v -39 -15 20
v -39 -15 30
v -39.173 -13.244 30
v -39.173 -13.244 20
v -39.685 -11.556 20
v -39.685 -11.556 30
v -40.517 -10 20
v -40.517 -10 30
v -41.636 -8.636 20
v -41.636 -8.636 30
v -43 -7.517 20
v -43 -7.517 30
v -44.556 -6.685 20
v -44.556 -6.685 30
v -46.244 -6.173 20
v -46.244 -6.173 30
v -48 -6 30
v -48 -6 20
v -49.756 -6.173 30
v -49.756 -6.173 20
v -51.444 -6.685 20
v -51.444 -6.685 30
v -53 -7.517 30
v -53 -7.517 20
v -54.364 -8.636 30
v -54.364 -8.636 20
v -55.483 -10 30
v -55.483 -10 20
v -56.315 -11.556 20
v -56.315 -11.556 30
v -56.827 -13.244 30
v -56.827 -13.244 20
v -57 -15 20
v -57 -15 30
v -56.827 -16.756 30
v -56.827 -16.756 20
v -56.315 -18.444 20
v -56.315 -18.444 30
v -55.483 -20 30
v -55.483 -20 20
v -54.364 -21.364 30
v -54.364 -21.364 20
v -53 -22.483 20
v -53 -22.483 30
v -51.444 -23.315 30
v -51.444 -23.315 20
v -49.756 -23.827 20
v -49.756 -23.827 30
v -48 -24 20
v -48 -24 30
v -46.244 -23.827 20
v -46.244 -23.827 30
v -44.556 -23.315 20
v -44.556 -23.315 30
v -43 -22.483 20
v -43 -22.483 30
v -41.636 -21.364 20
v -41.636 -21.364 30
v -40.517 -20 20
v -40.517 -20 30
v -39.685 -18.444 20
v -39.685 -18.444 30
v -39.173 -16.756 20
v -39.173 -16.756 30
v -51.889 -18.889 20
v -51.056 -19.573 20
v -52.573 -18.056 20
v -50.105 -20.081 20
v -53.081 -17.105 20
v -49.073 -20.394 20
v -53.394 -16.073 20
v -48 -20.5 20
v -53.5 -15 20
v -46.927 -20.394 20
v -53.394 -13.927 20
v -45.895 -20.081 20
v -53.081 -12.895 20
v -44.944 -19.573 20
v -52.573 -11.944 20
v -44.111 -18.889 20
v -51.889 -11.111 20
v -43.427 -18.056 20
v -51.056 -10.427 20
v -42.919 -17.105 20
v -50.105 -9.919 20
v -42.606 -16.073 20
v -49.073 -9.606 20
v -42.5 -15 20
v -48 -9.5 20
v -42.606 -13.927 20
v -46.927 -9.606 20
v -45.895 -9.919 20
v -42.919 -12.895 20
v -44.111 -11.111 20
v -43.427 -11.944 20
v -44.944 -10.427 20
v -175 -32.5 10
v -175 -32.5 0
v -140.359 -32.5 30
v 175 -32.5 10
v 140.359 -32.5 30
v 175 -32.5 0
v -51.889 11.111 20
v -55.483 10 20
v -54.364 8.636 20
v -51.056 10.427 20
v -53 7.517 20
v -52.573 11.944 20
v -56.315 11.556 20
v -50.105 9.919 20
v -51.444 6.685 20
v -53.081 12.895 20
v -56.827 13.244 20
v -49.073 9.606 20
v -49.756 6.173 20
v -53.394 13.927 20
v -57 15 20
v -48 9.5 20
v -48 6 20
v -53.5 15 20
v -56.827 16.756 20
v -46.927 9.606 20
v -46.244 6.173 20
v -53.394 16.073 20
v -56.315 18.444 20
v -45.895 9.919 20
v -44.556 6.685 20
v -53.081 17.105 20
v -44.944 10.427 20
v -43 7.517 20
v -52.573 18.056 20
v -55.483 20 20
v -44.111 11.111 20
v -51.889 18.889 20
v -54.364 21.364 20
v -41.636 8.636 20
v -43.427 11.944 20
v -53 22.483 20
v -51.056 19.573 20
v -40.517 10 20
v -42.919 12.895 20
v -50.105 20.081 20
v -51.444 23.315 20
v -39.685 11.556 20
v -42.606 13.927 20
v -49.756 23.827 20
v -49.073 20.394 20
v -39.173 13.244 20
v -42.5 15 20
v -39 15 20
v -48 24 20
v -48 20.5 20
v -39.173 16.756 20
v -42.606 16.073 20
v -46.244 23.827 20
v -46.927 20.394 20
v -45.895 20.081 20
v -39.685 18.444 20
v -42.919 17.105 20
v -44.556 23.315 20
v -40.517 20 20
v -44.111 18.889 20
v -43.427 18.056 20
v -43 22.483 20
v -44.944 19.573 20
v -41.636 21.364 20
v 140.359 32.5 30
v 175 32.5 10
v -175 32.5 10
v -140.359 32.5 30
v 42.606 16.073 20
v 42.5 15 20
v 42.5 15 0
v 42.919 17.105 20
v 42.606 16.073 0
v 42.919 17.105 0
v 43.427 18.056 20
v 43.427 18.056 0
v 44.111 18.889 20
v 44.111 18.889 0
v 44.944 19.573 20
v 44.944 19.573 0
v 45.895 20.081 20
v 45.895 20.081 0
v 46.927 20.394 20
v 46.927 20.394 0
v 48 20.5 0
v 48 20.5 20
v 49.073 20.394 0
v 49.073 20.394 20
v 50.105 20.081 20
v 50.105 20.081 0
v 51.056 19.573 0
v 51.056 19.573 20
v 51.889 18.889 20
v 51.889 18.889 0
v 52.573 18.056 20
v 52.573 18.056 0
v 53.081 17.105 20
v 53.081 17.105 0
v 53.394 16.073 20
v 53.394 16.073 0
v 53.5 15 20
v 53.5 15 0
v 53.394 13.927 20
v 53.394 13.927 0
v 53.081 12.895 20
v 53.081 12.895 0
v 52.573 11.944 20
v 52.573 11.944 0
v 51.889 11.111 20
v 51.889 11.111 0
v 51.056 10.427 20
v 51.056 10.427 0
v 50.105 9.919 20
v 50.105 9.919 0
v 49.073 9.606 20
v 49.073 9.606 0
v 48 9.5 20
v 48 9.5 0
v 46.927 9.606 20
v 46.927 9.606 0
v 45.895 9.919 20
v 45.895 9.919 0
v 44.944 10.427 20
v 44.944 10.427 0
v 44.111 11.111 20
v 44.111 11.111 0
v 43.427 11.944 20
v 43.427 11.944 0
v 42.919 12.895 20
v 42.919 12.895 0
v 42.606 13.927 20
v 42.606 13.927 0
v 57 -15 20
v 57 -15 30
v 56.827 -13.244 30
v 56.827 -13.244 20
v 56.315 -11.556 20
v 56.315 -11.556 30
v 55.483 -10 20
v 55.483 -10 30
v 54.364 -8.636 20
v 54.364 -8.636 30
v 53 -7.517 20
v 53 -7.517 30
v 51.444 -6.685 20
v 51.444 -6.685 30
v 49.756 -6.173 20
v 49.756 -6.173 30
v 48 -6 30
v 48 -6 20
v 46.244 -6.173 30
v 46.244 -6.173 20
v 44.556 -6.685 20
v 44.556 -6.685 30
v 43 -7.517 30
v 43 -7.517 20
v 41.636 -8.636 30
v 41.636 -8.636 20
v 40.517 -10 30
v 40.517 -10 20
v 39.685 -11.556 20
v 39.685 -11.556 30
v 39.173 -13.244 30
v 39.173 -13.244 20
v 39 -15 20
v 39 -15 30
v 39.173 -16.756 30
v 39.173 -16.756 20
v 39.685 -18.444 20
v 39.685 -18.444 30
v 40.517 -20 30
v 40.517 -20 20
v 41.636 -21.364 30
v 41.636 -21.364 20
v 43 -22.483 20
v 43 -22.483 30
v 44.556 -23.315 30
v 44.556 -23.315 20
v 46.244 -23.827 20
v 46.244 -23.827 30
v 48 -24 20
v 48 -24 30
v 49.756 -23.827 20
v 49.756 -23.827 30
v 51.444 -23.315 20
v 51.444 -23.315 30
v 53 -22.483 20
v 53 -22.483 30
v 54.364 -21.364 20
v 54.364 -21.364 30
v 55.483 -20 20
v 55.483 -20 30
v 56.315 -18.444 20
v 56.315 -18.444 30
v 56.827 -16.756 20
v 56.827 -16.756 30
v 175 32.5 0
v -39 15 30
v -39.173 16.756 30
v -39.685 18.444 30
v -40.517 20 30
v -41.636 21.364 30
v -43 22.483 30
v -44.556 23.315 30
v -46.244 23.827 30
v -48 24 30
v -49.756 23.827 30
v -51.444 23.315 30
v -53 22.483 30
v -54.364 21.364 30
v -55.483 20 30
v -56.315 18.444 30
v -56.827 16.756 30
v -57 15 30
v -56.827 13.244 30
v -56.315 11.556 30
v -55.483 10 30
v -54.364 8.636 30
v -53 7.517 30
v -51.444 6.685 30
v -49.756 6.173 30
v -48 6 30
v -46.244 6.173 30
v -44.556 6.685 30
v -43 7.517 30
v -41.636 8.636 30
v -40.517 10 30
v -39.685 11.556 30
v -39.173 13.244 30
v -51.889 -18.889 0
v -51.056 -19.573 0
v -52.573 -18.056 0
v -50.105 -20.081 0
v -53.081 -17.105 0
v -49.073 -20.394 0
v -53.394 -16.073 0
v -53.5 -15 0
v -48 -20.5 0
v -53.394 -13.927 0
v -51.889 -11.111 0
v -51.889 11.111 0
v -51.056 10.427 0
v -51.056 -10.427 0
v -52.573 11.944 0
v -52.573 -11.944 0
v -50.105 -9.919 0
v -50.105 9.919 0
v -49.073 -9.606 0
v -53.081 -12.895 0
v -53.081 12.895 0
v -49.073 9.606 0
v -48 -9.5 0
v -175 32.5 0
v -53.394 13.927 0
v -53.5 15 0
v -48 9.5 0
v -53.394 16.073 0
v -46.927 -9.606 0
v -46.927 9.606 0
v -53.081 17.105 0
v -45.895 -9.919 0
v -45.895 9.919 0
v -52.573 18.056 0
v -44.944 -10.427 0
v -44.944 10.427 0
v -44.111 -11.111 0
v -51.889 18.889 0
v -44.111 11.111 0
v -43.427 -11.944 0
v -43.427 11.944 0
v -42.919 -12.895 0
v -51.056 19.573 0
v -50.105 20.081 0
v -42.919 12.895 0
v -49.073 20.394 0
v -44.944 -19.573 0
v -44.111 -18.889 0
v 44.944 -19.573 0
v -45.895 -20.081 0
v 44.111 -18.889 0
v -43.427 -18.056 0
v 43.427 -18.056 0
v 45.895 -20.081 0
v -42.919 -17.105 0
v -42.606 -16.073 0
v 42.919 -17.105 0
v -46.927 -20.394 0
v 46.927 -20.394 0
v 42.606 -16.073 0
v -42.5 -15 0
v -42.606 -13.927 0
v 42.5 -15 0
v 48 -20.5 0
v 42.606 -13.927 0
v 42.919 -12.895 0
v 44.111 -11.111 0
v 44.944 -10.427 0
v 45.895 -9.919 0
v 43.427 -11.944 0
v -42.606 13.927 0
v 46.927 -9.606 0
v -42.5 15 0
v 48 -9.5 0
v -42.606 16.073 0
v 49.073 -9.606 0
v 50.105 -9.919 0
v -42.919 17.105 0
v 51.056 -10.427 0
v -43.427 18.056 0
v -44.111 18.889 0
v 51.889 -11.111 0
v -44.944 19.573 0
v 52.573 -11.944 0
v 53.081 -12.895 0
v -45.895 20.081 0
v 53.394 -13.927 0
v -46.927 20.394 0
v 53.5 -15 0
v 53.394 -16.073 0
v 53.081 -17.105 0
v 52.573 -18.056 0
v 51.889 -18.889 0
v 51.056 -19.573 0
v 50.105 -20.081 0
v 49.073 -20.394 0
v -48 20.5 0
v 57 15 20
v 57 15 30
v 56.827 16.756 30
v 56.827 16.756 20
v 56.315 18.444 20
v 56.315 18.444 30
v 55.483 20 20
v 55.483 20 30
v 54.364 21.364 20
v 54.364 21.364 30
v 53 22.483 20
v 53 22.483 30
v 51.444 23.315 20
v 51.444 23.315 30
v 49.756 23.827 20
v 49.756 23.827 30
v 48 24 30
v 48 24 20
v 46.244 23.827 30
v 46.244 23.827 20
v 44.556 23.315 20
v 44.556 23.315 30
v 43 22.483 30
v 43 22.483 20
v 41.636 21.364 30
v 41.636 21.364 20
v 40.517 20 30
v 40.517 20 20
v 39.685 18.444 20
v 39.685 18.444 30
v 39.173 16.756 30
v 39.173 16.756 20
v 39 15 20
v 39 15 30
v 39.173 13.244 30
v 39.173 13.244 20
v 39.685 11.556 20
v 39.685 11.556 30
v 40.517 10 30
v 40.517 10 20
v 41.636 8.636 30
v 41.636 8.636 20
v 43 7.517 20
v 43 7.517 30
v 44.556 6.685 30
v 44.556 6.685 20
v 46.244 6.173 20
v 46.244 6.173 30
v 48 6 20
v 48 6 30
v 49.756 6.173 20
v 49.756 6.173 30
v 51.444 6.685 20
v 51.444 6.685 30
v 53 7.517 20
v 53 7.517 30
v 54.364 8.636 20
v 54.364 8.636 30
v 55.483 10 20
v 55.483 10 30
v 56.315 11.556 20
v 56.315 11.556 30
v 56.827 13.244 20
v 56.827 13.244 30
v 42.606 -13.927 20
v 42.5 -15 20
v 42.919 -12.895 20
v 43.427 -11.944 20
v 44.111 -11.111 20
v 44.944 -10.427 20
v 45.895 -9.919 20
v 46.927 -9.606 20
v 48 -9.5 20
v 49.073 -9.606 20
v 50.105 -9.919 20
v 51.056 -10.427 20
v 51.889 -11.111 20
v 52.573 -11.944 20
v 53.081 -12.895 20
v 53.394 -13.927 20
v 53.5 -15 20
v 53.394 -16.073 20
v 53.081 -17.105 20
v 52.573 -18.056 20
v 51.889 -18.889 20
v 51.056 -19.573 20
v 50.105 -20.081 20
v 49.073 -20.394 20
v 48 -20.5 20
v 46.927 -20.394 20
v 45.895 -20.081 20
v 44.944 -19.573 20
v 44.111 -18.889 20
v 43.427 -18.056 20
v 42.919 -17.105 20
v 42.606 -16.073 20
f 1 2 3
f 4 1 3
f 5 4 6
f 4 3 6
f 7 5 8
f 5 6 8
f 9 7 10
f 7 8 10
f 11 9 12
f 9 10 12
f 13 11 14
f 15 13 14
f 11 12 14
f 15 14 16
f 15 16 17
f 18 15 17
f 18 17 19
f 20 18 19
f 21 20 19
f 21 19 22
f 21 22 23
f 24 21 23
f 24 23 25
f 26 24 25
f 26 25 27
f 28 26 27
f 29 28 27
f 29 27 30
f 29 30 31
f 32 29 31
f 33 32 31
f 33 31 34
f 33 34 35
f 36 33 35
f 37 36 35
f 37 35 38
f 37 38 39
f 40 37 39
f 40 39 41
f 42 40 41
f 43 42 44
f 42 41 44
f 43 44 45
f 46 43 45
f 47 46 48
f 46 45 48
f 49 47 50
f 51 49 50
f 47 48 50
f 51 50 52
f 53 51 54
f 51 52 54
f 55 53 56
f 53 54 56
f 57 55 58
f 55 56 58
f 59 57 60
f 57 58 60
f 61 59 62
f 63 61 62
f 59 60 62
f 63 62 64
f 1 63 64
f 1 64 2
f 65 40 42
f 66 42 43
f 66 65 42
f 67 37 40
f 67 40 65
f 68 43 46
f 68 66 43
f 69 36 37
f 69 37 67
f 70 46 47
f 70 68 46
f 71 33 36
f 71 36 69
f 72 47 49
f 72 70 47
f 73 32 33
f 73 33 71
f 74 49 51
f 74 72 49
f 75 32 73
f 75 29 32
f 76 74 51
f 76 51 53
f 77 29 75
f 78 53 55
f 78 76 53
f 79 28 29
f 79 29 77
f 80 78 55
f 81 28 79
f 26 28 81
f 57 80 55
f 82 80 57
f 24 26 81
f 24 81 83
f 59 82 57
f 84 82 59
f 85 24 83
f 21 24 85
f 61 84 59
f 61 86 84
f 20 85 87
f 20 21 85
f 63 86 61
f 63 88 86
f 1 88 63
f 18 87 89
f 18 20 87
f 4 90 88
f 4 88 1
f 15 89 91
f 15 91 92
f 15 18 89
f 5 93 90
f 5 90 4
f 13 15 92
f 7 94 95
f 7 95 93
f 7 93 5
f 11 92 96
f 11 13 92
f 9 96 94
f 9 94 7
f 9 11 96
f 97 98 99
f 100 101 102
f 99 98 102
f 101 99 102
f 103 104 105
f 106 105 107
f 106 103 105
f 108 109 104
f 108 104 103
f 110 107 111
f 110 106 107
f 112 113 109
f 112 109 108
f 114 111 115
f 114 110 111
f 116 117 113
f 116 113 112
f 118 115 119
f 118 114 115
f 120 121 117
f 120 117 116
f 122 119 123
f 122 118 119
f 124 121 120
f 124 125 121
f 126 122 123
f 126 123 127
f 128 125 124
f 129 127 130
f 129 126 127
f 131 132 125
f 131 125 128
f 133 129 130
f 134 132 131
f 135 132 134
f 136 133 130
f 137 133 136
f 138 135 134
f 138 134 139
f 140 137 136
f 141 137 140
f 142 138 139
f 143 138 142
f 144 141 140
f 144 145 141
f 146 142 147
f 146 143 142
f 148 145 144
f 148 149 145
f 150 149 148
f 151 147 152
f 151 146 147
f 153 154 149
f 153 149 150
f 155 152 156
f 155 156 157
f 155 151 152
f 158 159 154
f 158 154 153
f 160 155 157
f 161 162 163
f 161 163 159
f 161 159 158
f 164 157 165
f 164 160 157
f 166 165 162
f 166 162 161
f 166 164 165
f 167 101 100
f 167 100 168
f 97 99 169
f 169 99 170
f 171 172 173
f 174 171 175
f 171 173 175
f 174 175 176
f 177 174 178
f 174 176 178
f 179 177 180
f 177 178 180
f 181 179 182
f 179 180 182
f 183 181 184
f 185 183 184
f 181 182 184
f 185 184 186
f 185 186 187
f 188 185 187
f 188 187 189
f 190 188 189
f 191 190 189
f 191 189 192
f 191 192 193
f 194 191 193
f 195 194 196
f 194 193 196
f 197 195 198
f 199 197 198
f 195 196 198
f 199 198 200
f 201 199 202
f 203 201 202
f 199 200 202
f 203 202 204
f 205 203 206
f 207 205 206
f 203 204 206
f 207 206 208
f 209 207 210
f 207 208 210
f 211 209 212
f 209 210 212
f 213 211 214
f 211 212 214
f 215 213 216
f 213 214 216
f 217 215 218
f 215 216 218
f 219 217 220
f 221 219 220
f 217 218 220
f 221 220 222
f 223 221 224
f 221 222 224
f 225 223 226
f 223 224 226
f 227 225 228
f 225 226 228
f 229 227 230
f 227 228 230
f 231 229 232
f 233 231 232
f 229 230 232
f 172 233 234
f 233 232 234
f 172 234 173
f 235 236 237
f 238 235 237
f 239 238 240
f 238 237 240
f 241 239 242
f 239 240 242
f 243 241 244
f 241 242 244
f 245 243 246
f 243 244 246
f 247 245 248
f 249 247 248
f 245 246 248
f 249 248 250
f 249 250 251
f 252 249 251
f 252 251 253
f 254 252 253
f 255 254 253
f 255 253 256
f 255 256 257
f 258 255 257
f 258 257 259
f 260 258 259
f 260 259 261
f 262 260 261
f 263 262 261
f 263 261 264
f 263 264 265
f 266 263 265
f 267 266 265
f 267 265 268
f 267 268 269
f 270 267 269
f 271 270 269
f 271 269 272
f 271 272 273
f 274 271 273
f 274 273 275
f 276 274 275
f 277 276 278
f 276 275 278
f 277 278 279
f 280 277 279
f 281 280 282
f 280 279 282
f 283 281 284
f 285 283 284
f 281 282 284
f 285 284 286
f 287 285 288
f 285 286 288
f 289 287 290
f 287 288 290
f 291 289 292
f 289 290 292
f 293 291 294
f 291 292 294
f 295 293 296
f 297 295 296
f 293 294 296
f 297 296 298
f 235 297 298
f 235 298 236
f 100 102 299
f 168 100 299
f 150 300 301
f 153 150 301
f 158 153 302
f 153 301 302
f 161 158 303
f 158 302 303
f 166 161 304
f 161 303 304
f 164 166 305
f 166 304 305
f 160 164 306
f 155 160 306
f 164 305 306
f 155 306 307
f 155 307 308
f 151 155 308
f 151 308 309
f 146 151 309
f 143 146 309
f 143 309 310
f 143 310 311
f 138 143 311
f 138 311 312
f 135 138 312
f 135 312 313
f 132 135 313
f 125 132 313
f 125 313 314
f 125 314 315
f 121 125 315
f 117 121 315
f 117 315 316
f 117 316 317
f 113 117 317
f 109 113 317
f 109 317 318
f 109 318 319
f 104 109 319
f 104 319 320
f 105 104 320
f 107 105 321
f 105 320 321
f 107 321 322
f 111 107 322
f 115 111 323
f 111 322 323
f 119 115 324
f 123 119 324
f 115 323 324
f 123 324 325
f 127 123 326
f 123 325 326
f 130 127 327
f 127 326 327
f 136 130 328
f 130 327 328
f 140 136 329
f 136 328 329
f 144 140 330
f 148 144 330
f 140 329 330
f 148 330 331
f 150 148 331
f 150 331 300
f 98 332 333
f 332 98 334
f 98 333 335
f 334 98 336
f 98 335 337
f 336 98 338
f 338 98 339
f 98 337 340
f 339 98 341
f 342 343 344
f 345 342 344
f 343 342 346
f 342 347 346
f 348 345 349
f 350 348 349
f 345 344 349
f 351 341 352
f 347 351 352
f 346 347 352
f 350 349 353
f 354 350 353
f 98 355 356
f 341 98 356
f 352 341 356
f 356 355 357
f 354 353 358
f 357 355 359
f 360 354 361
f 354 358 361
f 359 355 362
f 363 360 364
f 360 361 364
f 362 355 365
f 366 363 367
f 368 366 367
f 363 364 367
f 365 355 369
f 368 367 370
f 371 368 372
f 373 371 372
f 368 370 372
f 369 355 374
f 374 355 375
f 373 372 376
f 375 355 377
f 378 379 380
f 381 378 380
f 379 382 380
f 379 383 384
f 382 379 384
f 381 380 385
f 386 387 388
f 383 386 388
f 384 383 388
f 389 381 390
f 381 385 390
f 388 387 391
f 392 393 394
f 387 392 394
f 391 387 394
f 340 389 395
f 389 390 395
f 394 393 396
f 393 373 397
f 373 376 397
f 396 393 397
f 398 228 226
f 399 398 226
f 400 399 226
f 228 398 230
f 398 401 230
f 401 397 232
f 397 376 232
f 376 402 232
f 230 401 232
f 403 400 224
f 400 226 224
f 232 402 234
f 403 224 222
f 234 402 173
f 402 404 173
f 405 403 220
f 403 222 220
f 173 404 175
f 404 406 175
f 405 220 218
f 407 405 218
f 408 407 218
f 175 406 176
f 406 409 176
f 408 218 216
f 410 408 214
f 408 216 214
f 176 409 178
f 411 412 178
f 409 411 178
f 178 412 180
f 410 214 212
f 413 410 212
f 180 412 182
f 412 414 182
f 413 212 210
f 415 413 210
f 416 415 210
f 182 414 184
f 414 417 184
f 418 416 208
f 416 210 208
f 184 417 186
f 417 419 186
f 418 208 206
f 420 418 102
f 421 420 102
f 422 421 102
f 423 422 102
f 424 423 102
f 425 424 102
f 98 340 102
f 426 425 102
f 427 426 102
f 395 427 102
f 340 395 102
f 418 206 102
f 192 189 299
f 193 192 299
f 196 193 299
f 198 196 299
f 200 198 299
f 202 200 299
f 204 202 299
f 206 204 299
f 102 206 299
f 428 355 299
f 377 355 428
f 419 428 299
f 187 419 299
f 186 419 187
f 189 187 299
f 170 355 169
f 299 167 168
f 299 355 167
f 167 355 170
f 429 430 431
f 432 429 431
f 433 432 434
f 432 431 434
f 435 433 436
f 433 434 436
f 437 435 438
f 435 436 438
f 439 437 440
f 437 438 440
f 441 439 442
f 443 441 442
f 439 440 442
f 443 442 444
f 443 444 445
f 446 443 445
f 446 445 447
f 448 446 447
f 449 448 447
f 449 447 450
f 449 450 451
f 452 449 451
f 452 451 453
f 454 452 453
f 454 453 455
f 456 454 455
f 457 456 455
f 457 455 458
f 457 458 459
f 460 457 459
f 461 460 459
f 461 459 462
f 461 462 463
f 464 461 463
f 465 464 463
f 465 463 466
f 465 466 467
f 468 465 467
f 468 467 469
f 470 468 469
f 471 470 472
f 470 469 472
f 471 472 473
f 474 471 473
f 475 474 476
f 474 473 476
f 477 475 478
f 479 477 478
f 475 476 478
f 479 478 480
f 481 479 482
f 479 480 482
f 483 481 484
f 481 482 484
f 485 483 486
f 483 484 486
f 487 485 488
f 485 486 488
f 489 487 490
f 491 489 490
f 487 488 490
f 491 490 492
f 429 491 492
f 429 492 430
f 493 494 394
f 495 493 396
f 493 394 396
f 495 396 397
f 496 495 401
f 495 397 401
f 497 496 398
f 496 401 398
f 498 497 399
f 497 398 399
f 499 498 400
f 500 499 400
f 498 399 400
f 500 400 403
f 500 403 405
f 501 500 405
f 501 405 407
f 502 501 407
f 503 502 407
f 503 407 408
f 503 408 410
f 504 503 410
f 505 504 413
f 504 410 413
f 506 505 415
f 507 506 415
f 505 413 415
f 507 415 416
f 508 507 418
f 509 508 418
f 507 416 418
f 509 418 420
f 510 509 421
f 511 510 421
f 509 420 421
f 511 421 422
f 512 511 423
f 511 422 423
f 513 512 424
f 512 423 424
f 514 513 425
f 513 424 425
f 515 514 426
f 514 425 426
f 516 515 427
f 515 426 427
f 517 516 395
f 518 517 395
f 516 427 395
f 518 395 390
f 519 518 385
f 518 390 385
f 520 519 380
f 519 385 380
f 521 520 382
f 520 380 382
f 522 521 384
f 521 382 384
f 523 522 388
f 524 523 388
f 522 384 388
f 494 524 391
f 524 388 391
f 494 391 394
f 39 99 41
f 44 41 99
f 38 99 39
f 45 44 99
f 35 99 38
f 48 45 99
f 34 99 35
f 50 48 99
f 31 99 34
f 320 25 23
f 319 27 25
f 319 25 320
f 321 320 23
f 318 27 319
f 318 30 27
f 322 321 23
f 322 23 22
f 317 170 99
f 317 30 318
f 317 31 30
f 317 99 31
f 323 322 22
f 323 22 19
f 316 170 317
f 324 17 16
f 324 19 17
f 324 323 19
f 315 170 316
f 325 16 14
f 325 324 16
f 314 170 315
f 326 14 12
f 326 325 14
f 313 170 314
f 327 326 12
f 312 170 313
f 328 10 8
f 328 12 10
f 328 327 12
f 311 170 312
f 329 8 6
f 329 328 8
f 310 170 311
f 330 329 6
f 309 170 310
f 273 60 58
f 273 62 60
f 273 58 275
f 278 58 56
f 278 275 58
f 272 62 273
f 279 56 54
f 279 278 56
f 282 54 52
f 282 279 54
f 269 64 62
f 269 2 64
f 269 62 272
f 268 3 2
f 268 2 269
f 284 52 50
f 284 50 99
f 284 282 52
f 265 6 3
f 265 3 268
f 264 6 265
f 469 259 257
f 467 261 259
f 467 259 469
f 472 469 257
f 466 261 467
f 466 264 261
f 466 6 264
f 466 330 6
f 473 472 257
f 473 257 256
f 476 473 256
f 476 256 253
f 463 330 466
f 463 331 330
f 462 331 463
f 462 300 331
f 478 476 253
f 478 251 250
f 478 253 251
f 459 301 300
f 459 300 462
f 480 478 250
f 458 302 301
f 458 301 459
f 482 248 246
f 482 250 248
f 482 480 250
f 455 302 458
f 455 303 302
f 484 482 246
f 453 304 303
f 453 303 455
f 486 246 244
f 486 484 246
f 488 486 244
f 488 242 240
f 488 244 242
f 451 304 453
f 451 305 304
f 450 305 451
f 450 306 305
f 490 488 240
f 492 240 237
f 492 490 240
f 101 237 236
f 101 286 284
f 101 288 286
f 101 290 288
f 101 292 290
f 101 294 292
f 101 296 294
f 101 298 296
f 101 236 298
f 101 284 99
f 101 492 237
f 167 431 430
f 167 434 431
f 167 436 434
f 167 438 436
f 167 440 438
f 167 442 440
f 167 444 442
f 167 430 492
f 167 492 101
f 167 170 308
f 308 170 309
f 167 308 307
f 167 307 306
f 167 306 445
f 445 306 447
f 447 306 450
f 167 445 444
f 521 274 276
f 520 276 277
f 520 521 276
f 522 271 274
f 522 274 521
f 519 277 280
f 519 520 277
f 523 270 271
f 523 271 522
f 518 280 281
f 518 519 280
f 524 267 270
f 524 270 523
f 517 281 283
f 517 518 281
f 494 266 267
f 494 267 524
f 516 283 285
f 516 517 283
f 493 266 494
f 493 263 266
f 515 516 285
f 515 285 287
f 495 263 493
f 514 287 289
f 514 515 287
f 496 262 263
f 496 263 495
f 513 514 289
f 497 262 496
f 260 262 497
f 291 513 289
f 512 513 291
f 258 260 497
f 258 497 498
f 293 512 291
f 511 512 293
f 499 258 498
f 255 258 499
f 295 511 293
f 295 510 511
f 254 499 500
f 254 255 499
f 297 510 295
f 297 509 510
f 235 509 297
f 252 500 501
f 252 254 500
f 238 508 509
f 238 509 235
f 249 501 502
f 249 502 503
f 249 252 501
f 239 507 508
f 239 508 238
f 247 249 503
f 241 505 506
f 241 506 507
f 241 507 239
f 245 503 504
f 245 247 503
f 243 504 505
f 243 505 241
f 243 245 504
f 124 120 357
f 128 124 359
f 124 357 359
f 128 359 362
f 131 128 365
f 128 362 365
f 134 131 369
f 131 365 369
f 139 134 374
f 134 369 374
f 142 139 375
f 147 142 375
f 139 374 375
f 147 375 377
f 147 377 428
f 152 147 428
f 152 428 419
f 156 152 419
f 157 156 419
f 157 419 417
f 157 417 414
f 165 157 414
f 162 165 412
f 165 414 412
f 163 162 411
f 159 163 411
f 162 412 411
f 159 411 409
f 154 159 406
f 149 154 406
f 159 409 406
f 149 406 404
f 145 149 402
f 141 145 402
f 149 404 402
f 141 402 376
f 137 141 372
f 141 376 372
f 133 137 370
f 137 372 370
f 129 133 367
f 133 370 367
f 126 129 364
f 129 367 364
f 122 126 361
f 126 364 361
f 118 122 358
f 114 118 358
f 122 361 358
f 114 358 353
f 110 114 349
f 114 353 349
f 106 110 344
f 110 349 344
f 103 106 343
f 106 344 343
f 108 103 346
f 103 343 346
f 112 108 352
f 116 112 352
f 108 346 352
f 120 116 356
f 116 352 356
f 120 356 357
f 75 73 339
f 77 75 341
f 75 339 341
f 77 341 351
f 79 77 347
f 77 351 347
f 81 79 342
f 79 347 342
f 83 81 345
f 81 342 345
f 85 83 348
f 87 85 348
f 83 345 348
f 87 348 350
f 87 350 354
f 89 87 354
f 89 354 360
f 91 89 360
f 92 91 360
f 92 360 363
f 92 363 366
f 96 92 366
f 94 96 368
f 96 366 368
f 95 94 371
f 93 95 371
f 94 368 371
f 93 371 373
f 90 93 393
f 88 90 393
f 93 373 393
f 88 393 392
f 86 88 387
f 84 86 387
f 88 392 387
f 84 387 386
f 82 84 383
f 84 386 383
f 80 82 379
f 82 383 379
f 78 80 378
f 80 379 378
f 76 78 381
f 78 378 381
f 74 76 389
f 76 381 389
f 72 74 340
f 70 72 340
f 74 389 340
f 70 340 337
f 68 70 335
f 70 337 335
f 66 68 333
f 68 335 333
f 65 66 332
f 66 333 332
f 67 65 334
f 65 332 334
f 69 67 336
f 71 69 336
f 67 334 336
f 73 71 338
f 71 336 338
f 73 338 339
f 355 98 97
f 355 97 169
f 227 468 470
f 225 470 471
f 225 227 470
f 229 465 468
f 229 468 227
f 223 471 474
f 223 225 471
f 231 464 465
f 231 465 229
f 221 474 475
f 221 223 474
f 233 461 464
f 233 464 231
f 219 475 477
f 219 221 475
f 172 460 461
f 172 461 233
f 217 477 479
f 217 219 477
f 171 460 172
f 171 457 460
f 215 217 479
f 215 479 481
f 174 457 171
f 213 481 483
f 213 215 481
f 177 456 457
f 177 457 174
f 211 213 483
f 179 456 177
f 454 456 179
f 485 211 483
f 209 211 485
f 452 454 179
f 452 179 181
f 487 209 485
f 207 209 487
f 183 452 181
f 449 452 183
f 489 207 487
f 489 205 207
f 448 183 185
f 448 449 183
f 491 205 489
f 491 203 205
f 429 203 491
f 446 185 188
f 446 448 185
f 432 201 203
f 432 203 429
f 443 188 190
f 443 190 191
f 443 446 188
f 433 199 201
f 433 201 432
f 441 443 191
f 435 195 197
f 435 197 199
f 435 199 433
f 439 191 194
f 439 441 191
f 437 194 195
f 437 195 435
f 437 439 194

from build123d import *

# Parameters (mm, degrees)
F0_W           = 350
F0_H           = 65
F1_DEPTH       = 30
F3_D           = 11
F3_CBORE_D     = 18
F3_CBORE_DEPTH = 10
F4_SIZE2       = 34.6410161514
F4_SIZE        = 20
F4_2_SIZE2     = 34.6410161514
F4_2_SIZE      = 20


with BuildPart() as f1:
    # F0 (on Top) → F1 (new body)
    with BuildSketch(Plane.XY):
        Rectangle(F0_W, F0_H)
    extrude(amount=F1_DEPTH)

    # F3 (through all)
    with Locations(Plane.XY.offset(30)):
        with Locations((-48, 15), (48, 15), (48, -15), (-48, -15)):
            CounterBoreHole(F3_D / 2, F3_CBORE_D / 2, F3_CBORE_DEPTH)

    # F4
    f4_edges = [f1.edges().sort_by_distance(p)[0] for p in [
        (-175, 0, 30),
    ]]
    f4_side = f1.faces().sort_by_distance((-175, 0, 15))[0]
    chamfer(f4_edges, length=F4_SIZE, length2=F4_SIZE2, reference=f4_side)

    # F4#2
    f4_2_edges = [f1.edges().sort_by_distance(p)[0] for p in [
        (175, 0, 30),
    ]]
    f4_2_side = f1.faces().sort_by_distance((175, 0, 15))[0]
    chamfer(f4_2_edges, length=F4_2_SIZE, length2=F4_2_SIZE2, reference=f4_2_side)


solid = f1.part
